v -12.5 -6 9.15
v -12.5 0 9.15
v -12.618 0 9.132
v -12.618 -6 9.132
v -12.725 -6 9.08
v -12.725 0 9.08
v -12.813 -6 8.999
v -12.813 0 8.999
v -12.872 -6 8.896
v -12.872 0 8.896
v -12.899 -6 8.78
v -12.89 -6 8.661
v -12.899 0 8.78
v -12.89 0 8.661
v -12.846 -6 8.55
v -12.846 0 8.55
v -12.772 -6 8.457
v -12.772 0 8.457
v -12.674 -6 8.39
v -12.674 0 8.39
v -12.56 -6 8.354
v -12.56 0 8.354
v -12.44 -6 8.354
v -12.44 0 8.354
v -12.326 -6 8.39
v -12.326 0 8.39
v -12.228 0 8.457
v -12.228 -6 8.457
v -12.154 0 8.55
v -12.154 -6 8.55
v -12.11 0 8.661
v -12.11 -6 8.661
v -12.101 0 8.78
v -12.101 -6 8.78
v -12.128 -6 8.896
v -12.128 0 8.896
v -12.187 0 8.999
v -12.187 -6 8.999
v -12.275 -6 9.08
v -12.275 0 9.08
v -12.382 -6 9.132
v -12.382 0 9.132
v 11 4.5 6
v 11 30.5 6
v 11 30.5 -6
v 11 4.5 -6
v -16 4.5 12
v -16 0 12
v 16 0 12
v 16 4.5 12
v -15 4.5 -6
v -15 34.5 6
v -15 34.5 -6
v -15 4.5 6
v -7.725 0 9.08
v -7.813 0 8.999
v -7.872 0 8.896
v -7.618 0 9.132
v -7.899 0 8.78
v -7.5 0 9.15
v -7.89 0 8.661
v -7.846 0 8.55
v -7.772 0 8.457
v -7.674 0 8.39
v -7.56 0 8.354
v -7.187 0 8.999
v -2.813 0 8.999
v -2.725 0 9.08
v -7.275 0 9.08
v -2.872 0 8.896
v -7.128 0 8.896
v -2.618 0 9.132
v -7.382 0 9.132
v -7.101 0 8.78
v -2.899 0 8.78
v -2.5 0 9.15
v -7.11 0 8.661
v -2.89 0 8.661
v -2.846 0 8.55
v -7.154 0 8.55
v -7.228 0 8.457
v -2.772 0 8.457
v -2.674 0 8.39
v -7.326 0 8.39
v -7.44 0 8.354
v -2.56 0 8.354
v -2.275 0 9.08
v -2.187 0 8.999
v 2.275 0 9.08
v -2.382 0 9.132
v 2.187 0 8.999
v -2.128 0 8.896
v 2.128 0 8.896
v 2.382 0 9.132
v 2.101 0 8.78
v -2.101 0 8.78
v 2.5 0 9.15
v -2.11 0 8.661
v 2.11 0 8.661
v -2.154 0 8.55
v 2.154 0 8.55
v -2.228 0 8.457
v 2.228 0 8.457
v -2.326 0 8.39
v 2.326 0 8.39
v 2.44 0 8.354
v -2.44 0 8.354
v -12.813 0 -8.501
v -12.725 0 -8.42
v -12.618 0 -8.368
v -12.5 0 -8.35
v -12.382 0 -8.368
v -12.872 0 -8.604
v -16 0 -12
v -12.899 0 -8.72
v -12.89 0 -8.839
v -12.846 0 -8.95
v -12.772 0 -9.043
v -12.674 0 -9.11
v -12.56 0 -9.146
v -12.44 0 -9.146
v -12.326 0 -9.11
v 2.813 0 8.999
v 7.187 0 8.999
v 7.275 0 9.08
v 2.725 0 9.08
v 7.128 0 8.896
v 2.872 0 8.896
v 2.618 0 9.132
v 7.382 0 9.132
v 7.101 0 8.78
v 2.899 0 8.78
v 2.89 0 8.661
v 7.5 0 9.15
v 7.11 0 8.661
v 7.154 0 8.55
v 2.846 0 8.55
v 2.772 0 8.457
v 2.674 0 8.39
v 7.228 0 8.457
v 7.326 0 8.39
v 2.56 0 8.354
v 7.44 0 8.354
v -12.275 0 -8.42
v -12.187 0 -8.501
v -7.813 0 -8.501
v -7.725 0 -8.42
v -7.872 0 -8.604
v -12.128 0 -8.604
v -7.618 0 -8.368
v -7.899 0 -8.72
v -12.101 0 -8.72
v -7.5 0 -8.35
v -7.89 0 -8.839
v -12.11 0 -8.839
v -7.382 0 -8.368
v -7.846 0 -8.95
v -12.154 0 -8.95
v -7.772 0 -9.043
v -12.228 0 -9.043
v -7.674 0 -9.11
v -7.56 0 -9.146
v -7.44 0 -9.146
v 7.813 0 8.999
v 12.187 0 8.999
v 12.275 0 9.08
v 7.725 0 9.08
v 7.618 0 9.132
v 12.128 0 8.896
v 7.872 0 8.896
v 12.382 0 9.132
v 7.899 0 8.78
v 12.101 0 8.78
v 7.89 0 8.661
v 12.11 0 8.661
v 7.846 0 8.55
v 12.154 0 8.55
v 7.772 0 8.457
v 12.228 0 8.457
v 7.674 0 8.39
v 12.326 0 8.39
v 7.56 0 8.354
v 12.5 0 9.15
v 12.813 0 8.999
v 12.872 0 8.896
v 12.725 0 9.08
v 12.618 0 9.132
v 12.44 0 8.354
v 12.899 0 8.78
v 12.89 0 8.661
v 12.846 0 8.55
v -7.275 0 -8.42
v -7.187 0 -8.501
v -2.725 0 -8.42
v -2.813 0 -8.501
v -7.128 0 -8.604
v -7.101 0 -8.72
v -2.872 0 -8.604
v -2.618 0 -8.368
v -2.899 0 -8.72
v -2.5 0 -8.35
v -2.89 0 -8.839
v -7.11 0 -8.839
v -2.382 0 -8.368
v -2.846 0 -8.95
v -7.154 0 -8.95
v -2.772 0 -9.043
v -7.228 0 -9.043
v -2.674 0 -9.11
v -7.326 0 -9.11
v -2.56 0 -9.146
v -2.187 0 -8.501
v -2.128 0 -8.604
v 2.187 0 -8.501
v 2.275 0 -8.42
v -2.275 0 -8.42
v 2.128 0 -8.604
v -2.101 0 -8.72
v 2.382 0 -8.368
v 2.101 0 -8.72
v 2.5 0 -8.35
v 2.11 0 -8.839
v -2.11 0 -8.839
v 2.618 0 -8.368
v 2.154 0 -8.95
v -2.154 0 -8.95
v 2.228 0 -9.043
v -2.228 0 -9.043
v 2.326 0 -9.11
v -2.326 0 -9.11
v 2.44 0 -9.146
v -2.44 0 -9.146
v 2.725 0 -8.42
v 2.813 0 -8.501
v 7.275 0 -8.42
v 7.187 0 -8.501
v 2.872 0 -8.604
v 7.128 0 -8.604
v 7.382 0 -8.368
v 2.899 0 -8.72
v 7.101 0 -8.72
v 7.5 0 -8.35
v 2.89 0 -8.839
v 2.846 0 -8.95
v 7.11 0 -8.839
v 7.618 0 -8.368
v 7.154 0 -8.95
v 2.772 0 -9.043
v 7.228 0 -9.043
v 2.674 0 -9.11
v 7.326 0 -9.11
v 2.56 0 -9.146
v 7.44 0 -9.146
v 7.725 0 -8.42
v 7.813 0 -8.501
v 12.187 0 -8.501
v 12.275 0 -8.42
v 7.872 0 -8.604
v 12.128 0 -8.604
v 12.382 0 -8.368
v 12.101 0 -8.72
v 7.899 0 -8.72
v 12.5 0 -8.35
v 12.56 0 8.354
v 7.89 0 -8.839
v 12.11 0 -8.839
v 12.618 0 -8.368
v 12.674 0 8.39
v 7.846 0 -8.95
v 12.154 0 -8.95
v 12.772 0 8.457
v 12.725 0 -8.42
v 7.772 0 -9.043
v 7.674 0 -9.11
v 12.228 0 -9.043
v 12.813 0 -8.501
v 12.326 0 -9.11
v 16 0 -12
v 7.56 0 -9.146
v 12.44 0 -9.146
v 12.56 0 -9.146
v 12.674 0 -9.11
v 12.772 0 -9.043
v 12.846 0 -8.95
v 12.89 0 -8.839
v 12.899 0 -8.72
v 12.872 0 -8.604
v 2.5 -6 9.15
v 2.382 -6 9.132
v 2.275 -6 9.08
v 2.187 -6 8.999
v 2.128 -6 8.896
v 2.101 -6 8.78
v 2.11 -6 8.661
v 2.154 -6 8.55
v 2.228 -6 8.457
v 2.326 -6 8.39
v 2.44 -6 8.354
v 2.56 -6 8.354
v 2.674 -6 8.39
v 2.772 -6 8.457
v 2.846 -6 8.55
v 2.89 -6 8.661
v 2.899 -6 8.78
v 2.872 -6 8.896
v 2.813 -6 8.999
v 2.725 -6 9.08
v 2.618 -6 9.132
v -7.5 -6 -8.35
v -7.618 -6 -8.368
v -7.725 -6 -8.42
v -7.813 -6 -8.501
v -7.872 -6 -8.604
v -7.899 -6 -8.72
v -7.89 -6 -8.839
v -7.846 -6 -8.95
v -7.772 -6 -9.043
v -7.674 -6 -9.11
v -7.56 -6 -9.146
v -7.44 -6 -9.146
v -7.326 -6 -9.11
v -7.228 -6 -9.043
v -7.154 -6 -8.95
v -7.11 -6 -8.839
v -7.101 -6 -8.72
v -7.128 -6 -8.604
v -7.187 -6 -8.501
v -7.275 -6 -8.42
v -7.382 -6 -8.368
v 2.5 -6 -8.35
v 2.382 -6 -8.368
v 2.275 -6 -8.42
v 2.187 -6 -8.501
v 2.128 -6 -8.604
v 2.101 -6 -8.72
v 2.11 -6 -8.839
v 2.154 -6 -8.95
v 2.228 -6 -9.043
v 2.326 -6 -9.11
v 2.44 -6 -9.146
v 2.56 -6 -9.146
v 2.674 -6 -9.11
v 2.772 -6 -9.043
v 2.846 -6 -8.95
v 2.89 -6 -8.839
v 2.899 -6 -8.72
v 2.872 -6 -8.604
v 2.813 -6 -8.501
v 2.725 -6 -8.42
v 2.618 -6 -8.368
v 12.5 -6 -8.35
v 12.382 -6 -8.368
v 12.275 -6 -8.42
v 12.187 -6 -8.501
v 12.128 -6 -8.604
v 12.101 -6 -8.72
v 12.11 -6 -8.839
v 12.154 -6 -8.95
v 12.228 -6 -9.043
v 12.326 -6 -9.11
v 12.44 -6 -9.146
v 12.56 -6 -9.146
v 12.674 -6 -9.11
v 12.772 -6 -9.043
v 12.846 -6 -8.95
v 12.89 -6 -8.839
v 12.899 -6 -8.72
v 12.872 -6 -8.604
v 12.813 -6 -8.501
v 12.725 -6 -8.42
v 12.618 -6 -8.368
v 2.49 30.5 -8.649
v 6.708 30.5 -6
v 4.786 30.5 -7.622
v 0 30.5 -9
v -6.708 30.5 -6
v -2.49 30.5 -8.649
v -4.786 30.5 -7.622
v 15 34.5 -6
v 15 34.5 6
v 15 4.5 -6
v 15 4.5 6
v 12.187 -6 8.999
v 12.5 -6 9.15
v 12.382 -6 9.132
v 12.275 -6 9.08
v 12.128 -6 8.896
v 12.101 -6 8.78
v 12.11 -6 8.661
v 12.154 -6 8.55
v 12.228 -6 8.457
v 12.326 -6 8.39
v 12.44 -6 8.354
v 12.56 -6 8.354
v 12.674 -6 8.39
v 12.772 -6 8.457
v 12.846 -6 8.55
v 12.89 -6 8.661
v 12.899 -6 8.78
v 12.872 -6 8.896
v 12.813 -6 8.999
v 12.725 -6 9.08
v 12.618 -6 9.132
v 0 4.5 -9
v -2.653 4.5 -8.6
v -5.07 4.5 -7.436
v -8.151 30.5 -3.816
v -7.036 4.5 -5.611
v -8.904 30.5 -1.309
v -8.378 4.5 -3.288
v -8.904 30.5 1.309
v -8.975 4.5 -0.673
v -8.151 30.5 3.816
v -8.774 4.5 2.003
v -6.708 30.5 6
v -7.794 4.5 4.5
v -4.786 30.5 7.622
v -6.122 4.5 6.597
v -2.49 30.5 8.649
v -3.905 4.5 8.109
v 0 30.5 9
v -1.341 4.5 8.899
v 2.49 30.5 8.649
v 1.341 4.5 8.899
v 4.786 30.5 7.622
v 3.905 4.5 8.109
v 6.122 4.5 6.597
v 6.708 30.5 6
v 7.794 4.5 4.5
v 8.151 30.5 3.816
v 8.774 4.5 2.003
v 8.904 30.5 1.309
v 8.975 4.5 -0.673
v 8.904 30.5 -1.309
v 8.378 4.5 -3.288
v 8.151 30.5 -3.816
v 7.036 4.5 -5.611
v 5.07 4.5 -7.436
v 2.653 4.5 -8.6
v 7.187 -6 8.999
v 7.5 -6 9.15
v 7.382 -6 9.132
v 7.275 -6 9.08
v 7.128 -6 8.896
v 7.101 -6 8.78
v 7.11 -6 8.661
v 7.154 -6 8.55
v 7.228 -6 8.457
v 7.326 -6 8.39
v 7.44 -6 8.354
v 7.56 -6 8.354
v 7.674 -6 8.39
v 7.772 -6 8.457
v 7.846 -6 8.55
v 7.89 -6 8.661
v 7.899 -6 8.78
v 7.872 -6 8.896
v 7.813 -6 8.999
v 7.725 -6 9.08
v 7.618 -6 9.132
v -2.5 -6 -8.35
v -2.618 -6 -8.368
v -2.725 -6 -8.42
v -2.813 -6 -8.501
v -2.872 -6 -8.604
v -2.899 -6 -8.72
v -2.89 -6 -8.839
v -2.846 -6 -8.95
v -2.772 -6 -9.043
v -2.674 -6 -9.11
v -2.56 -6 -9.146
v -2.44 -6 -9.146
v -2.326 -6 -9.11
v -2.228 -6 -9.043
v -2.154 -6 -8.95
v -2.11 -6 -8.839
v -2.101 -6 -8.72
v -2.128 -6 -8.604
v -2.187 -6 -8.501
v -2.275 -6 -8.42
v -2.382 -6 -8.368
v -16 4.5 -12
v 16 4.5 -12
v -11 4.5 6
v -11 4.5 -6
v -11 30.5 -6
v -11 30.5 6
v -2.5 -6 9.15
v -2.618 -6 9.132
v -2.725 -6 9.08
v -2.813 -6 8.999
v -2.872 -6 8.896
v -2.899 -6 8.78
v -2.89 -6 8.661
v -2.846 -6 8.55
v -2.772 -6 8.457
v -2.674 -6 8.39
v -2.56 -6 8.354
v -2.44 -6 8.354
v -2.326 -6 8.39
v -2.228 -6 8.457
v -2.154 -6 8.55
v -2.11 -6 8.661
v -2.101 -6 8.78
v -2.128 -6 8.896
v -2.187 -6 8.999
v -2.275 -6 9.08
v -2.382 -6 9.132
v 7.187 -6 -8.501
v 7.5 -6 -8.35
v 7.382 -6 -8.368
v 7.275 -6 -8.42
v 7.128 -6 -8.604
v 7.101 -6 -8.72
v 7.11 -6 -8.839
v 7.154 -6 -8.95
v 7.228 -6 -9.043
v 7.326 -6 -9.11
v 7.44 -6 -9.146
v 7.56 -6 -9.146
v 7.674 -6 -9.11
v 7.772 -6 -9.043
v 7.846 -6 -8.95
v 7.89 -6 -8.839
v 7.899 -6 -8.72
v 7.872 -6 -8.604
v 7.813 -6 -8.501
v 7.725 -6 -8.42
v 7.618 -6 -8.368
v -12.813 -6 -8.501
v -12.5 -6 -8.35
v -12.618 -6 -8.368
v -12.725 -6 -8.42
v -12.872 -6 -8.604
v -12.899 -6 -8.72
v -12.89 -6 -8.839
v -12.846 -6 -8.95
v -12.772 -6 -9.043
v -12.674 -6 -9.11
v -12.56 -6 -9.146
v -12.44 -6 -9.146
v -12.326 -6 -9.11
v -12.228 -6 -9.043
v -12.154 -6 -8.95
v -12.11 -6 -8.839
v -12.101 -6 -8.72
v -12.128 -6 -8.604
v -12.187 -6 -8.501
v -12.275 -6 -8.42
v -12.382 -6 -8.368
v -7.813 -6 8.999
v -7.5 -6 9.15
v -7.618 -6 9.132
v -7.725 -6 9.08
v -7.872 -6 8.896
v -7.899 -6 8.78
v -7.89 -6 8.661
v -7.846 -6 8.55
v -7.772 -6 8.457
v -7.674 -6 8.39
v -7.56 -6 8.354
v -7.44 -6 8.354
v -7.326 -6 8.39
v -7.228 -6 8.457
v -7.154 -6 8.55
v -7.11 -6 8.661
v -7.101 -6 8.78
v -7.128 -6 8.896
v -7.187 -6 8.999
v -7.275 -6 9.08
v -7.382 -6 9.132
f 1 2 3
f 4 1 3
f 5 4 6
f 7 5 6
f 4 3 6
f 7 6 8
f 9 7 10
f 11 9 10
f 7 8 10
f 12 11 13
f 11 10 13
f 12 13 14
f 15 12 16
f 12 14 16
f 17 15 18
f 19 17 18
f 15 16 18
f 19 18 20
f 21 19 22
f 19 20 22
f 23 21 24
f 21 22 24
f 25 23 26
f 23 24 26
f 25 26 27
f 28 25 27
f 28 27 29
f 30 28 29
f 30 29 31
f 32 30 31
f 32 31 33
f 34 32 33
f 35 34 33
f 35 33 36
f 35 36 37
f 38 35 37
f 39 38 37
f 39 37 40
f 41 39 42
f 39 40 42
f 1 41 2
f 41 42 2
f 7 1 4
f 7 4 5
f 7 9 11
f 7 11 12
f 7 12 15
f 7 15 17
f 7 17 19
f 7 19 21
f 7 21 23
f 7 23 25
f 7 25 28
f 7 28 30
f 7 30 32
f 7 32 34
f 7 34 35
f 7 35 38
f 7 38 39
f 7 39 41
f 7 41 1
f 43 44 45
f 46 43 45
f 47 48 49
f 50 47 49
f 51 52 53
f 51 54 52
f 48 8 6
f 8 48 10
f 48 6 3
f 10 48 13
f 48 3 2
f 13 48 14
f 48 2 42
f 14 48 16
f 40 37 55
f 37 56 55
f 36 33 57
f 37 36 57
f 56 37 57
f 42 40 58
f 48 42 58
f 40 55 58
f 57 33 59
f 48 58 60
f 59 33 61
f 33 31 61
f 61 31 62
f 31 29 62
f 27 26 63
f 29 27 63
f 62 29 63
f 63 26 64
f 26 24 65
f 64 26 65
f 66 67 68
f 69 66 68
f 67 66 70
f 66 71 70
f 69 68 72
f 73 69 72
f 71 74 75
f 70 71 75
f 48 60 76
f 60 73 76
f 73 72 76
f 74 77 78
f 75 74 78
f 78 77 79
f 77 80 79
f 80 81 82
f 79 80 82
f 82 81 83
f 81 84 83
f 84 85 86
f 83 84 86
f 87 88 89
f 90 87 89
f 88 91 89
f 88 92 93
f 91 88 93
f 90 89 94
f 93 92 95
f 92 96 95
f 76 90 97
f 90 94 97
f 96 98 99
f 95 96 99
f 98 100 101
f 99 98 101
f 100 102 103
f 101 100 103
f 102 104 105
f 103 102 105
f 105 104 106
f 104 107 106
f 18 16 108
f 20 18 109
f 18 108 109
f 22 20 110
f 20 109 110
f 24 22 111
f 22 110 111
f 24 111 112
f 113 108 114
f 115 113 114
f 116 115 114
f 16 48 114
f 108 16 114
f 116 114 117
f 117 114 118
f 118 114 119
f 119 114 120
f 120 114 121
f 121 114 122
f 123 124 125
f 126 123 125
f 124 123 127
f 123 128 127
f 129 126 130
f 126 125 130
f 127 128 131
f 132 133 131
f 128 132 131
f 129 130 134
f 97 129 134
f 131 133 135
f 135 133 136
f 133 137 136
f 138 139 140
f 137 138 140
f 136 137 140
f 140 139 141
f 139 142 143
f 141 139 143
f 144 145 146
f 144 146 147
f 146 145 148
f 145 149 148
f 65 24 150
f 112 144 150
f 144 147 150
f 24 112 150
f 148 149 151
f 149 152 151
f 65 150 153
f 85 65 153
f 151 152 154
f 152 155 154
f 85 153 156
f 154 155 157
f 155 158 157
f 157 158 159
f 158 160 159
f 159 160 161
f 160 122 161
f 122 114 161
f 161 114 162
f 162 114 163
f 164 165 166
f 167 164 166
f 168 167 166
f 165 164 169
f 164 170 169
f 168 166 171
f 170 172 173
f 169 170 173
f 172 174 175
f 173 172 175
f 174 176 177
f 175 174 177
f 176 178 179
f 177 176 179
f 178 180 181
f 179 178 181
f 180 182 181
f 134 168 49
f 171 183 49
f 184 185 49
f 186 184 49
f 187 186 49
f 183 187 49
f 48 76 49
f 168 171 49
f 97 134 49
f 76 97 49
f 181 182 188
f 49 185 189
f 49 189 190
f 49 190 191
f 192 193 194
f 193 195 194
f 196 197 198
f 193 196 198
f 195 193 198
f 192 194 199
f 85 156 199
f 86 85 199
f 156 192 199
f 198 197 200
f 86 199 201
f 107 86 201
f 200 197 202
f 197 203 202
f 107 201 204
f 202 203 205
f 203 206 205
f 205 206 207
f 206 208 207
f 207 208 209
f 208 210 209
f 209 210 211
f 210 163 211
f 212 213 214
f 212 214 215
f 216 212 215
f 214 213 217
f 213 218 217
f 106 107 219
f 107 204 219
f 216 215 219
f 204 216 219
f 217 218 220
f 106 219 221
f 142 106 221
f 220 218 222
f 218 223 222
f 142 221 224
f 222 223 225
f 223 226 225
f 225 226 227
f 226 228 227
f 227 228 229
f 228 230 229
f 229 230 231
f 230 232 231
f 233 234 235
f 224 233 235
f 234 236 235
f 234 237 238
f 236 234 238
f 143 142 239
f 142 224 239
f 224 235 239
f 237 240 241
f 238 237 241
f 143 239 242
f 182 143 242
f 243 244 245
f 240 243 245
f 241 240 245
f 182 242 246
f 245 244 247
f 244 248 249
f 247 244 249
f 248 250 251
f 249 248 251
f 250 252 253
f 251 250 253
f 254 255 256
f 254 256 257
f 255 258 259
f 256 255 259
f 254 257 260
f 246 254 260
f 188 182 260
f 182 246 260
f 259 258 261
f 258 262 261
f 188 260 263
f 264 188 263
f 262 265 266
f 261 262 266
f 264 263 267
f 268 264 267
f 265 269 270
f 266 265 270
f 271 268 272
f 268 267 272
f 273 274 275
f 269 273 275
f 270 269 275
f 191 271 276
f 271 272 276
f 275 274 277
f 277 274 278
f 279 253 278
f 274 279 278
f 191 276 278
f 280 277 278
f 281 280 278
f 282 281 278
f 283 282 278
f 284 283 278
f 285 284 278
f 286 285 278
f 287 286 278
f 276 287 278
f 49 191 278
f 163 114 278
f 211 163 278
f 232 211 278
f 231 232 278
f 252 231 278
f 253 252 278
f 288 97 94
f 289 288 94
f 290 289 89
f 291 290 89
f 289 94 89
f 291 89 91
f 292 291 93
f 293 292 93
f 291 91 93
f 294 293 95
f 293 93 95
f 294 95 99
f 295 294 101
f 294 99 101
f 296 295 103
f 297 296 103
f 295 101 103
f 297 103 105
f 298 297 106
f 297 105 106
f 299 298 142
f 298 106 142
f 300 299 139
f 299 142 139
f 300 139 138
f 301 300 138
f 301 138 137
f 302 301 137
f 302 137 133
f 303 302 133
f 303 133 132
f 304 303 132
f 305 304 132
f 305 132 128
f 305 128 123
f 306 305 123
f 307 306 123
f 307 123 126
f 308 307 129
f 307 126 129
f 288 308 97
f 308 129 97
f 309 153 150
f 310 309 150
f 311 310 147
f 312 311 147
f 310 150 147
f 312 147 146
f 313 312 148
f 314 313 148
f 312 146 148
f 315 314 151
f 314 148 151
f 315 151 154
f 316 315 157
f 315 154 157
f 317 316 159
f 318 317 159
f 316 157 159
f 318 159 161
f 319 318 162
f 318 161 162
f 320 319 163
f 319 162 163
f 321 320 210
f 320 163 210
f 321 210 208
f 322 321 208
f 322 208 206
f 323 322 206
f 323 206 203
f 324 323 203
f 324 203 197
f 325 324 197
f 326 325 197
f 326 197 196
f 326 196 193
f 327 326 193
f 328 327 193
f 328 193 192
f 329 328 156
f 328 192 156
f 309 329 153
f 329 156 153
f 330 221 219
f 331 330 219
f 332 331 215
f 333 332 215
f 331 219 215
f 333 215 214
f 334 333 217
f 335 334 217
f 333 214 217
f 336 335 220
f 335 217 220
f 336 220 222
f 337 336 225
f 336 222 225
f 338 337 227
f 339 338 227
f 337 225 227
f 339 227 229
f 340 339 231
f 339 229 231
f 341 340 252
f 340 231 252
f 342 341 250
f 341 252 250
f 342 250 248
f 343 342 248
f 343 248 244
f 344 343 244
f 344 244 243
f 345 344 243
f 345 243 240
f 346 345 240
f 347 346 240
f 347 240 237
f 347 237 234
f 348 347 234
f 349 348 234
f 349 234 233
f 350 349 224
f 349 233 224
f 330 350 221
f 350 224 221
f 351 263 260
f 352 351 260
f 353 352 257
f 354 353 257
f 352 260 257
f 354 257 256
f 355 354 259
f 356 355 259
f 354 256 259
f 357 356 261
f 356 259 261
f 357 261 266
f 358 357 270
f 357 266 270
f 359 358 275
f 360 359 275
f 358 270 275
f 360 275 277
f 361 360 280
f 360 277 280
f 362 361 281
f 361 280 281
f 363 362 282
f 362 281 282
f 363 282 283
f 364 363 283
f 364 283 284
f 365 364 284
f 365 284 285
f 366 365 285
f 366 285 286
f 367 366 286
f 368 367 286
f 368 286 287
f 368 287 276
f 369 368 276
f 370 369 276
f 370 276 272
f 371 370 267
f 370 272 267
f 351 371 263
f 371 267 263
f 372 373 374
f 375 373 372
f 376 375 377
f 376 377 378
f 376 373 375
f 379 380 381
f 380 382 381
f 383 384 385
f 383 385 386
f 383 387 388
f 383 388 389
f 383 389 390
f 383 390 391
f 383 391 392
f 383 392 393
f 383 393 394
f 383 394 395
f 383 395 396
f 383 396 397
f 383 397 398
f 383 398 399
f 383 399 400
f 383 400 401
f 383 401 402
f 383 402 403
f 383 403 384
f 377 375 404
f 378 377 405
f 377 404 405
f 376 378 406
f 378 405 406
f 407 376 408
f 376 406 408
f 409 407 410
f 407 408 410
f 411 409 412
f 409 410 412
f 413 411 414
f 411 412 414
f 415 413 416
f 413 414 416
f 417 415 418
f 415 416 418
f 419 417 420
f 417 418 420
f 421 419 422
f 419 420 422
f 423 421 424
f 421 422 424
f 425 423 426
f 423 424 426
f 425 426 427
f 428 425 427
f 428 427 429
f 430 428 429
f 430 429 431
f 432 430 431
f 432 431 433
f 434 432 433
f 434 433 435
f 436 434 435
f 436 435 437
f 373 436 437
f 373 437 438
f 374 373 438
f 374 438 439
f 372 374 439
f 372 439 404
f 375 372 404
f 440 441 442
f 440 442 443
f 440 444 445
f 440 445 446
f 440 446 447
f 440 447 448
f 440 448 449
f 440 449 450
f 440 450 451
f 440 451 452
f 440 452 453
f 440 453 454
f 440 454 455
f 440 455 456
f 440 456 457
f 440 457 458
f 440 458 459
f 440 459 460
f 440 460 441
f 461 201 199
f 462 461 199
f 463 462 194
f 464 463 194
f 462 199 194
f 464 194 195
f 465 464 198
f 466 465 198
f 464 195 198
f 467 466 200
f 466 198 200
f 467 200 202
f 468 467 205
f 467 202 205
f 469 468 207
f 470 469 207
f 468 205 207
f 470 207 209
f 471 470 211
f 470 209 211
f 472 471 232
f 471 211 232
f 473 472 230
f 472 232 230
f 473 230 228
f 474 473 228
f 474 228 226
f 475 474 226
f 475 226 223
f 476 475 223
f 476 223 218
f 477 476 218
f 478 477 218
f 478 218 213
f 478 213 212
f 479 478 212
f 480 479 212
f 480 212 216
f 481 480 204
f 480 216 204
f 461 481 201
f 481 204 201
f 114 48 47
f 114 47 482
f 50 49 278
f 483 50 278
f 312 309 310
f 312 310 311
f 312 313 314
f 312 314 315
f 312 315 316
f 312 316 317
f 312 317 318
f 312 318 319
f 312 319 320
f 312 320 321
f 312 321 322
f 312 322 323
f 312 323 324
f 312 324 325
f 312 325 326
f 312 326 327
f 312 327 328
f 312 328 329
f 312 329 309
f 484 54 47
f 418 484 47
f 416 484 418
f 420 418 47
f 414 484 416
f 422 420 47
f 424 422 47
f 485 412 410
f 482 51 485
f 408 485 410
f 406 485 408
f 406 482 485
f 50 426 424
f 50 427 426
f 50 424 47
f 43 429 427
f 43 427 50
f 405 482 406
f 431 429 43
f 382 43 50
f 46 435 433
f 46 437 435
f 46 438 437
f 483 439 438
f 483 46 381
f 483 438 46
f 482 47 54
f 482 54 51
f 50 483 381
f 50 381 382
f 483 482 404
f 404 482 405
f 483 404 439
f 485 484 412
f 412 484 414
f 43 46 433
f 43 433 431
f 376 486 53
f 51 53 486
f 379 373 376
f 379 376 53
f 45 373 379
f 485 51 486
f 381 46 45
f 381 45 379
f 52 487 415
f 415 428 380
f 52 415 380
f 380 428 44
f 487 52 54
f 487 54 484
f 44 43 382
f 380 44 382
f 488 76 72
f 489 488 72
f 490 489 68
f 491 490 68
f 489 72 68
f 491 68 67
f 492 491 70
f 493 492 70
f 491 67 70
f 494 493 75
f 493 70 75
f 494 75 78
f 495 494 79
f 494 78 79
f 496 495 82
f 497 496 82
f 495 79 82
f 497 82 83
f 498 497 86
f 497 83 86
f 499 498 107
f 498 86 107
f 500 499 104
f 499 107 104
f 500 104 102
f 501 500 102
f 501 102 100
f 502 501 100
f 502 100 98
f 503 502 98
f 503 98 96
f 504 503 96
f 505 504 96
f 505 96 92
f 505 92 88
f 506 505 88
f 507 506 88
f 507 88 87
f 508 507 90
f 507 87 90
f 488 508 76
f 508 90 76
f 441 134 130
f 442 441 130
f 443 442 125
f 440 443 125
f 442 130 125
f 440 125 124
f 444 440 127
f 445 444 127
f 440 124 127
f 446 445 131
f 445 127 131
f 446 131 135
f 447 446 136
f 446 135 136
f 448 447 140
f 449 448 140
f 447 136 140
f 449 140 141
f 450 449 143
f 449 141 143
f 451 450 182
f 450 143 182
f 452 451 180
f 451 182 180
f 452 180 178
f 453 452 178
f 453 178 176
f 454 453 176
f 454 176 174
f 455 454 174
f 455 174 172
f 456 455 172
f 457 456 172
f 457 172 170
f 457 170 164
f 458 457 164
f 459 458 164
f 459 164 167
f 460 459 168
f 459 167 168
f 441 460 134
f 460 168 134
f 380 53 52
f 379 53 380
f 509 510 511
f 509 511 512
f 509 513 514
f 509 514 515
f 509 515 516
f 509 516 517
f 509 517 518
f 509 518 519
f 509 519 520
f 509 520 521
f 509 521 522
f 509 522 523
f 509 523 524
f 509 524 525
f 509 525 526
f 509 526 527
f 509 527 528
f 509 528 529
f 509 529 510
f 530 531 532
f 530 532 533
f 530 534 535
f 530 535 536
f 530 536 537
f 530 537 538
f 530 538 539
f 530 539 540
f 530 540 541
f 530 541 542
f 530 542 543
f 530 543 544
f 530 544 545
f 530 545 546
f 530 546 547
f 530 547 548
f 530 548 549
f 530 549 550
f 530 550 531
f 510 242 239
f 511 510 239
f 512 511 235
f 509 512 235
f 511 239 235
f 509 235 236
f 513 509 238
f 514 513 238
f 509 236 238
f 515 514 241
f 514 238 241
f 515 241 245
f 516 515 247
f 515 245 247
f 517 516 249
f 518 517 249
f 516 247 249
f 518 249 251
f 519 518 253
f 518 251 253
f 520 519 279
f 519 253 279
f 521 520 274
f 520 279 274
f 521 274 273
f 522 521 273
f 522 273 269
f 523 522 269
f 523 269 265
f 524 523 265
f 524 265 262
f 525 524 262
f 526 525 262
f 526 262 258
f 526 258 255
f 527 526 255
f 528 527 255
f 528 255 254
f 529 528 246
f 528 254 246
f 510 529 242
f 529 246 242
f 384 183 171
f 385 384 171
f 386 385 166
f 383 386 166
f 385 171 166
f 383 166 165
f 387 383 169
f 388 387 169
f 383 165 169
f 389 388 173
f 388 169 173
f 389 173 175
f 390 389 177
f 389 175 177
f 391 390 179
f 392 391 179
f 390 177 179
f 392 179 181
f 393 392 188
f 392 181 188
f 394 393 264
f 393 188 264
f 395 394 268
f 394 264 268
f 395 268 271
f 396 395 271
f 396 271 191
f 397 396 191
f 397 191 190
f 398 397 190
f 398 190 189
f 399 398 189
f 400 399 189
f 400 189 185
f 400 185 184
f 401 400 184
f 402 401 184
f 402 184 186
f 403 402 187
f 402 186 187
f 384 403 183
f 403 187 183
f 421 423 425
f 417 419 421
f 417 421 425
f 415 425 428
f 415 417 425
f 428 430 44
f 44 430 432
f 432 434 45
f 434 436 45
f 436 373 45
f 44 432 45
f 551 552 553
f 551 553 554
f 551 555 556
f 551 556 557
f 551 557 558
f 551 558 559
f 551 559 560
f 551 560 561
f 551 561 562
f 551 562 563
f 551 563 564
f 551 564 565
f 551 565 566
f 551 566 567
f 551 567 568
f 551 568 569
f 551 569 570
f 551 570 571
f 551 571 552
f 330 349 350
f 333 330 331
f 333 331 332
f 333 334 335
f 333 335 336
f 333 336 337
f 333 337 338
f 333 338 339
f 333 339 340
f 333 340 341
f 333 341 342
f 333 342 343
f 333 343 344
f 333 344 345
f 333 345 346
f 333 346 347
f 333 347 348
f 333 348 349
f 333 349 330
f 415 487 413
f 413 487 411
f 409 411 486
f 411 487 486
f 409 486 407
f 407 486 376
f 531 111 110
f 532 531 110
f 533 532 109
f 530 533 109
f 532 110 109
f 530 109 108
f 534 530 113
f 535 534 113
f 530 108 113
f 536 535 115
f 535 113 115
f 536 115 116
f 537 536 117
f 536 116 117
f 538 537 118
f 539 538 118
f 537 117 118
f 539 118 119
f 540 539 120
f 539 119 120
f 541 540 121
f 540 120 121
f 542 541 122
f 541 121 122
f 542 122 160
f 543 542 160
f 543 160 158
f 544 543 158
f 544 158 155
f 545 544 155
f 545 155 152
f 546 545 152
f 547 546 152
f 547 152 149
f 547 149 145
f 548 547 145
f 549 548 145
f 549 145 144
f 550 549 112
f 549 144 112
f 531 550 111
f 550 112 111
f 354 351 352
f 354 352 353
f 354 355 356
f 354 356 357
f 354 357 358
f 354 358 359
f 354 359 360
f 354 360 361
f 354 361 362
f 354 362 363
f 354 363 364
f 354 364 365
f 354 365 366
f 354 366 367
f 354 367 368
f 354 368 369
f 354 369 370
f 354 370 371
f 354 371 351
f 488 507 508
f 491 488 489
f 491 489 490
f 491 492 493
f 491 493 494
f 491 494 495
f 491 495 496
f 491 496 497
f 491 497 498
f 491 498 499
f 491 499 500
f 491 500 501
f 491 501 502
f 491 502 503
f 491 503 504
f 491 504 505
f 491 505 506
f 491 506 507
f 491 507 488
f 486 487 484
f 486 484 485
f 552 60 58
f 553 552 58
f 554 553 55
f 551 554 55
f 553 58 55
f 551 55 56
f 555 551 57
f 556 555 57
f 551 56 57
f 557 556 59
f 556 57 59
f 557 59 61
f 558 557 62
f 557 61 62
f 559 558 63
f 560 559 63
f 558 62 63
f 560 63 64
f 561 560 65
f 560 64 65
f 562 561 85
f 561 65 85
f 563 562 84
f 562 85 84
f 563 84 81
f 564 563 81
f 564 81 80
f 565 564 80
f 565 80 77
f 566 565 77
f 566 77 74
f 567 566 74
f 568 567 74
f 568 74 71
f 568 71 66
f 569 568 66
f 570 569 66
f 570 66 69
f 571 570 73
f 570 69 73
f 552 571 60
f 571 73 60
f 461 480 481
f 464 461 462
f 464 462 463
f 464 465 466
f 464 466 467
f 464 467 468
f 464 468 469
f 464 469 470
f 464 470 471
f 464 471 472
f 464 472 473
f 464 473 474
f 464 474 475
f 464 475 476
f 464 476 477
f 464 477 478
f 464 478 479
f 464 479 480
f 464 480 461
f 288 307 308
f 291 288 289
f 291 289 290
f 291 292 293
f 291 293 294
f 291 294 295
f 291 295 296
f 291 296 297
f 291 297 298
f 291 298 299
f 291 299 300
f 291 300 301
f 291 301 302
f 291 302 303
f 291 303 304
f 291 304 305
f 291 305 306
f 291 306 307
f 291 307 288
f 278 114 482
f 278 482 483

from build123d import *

# Parameters (mm, degrees)
SKETCH_1_W      = 32
SKETCH_1_H      = 24
EXTRUDE_1_DEPTH = 4.5
SKETCH_2_R      = 9
SKETCH_2_W      = 4
SKETCH_2_H      = 12
EXTRUDE_2_DEPTH = 26
SKETCH_3_W      = 30
SKETCH_3_H      = 12
EXTRUDE_3_DEPTH = 4
SKETCH_4_R      = 0.4
EXTRUDE_4_DEPTH = 6


with BuildPart() as part:
    # 스케치1 → 보스-돌출1 (new body)
    with BuildSketch(Plane(origin=(0, 0, 0), x_dir=(1, 0, 0), z_dir=(0, 1, 0))):
        Rectangle(SKETCH_1_W, SKETCH_1_H)
    extrude(amount=EXTRUDE_1_DEPTH)

    # 스케치2 → 보스-돌출2 (add)
    with BuildSketch(Plane(origin=(0, 4.5, 0), x_dir=(1, 0, 0), z_dir=(0, 1, 0))):
        with Locations(Location((0, 0, 0), (0, 0, 90))):
            Circle(SKETCH_2_R)
        with Locations((-13, 0)):
            Rectangle(SKETCH_2_W, SKETCH_2_H)
        with Locations((13, 0)):
            Rectangle(SKETCH_2_W, SKETCH_2_H)
    extrude(amount=EXTRUDE_2_DEPTH)

    # 스케치3 → 보스-돌출3 (add)
    with BuildSketch(Plane(origin=(0, 30.5, 0), x_dir=(1, 0, 0), z_dir=(0, 1, 0))):
        Rectangle(SKETCH_3_W, SKETCH_3_H)
    extrude(amount=EXTRUDE_3_DEPTH)

    # 스케치4 → 보스-돌출4 (add)
    with BuildSketch(Plane.XZ):
        with Locations(Location((2.5, -8.75, 0), (0, 0, 90))):
            Circle(SKETCH_4_R)
        with Locations(Location((7.5, -8.75, 0), (0, 0, 90))):
            Circle(SKETCH_4_R)
        with Locations(Location((12.5, -8.75, 0), (0, 0, 90))):
            Circle(SKETCH_4_R)
        with Locations(Location((-12.5, -8.75, 0), (0, 0, 90))):
            Circle(SKETCH_4_R)
        with Locations(Location((-7.5, -8.75, 0), (0, 0, 90))):
            Circle(SKETCH_4_R)
        with Locations(Location((-2.5, -8.75, 0), (0, 0, 90))):
            Circle(SKETCH_4_R)
        with Locations(Location((-2.5, 8.75, 0), (0, 0, 90))):
            Circle(SKETCH_4_R)
        with Locations(Location((-7.5, 8.75, 0), (0, 0, 90))):
            Circle(SKETCH_4_R)
        with Locations(Location((-12.5, 8.75, 0), (0, 0, 90))):
            Circle(SKETCH_4_R)
        with Locations(Location((12.5, 8.75, 0), (0, 0, 90))):
            Circle(SKETCH_4_R)
        with Locations(Location((7.5, 8.75, 0), (0, 0, 90))):
            Circle(SKETCH_4_R)
        with Locations(Location((2.5, 8.75, 0), (0, 0, 90))):
            Circle(SKETCH_4_R)
    extrude(amount=EXTRUDE_4_DEPTH)


solid = part.part
